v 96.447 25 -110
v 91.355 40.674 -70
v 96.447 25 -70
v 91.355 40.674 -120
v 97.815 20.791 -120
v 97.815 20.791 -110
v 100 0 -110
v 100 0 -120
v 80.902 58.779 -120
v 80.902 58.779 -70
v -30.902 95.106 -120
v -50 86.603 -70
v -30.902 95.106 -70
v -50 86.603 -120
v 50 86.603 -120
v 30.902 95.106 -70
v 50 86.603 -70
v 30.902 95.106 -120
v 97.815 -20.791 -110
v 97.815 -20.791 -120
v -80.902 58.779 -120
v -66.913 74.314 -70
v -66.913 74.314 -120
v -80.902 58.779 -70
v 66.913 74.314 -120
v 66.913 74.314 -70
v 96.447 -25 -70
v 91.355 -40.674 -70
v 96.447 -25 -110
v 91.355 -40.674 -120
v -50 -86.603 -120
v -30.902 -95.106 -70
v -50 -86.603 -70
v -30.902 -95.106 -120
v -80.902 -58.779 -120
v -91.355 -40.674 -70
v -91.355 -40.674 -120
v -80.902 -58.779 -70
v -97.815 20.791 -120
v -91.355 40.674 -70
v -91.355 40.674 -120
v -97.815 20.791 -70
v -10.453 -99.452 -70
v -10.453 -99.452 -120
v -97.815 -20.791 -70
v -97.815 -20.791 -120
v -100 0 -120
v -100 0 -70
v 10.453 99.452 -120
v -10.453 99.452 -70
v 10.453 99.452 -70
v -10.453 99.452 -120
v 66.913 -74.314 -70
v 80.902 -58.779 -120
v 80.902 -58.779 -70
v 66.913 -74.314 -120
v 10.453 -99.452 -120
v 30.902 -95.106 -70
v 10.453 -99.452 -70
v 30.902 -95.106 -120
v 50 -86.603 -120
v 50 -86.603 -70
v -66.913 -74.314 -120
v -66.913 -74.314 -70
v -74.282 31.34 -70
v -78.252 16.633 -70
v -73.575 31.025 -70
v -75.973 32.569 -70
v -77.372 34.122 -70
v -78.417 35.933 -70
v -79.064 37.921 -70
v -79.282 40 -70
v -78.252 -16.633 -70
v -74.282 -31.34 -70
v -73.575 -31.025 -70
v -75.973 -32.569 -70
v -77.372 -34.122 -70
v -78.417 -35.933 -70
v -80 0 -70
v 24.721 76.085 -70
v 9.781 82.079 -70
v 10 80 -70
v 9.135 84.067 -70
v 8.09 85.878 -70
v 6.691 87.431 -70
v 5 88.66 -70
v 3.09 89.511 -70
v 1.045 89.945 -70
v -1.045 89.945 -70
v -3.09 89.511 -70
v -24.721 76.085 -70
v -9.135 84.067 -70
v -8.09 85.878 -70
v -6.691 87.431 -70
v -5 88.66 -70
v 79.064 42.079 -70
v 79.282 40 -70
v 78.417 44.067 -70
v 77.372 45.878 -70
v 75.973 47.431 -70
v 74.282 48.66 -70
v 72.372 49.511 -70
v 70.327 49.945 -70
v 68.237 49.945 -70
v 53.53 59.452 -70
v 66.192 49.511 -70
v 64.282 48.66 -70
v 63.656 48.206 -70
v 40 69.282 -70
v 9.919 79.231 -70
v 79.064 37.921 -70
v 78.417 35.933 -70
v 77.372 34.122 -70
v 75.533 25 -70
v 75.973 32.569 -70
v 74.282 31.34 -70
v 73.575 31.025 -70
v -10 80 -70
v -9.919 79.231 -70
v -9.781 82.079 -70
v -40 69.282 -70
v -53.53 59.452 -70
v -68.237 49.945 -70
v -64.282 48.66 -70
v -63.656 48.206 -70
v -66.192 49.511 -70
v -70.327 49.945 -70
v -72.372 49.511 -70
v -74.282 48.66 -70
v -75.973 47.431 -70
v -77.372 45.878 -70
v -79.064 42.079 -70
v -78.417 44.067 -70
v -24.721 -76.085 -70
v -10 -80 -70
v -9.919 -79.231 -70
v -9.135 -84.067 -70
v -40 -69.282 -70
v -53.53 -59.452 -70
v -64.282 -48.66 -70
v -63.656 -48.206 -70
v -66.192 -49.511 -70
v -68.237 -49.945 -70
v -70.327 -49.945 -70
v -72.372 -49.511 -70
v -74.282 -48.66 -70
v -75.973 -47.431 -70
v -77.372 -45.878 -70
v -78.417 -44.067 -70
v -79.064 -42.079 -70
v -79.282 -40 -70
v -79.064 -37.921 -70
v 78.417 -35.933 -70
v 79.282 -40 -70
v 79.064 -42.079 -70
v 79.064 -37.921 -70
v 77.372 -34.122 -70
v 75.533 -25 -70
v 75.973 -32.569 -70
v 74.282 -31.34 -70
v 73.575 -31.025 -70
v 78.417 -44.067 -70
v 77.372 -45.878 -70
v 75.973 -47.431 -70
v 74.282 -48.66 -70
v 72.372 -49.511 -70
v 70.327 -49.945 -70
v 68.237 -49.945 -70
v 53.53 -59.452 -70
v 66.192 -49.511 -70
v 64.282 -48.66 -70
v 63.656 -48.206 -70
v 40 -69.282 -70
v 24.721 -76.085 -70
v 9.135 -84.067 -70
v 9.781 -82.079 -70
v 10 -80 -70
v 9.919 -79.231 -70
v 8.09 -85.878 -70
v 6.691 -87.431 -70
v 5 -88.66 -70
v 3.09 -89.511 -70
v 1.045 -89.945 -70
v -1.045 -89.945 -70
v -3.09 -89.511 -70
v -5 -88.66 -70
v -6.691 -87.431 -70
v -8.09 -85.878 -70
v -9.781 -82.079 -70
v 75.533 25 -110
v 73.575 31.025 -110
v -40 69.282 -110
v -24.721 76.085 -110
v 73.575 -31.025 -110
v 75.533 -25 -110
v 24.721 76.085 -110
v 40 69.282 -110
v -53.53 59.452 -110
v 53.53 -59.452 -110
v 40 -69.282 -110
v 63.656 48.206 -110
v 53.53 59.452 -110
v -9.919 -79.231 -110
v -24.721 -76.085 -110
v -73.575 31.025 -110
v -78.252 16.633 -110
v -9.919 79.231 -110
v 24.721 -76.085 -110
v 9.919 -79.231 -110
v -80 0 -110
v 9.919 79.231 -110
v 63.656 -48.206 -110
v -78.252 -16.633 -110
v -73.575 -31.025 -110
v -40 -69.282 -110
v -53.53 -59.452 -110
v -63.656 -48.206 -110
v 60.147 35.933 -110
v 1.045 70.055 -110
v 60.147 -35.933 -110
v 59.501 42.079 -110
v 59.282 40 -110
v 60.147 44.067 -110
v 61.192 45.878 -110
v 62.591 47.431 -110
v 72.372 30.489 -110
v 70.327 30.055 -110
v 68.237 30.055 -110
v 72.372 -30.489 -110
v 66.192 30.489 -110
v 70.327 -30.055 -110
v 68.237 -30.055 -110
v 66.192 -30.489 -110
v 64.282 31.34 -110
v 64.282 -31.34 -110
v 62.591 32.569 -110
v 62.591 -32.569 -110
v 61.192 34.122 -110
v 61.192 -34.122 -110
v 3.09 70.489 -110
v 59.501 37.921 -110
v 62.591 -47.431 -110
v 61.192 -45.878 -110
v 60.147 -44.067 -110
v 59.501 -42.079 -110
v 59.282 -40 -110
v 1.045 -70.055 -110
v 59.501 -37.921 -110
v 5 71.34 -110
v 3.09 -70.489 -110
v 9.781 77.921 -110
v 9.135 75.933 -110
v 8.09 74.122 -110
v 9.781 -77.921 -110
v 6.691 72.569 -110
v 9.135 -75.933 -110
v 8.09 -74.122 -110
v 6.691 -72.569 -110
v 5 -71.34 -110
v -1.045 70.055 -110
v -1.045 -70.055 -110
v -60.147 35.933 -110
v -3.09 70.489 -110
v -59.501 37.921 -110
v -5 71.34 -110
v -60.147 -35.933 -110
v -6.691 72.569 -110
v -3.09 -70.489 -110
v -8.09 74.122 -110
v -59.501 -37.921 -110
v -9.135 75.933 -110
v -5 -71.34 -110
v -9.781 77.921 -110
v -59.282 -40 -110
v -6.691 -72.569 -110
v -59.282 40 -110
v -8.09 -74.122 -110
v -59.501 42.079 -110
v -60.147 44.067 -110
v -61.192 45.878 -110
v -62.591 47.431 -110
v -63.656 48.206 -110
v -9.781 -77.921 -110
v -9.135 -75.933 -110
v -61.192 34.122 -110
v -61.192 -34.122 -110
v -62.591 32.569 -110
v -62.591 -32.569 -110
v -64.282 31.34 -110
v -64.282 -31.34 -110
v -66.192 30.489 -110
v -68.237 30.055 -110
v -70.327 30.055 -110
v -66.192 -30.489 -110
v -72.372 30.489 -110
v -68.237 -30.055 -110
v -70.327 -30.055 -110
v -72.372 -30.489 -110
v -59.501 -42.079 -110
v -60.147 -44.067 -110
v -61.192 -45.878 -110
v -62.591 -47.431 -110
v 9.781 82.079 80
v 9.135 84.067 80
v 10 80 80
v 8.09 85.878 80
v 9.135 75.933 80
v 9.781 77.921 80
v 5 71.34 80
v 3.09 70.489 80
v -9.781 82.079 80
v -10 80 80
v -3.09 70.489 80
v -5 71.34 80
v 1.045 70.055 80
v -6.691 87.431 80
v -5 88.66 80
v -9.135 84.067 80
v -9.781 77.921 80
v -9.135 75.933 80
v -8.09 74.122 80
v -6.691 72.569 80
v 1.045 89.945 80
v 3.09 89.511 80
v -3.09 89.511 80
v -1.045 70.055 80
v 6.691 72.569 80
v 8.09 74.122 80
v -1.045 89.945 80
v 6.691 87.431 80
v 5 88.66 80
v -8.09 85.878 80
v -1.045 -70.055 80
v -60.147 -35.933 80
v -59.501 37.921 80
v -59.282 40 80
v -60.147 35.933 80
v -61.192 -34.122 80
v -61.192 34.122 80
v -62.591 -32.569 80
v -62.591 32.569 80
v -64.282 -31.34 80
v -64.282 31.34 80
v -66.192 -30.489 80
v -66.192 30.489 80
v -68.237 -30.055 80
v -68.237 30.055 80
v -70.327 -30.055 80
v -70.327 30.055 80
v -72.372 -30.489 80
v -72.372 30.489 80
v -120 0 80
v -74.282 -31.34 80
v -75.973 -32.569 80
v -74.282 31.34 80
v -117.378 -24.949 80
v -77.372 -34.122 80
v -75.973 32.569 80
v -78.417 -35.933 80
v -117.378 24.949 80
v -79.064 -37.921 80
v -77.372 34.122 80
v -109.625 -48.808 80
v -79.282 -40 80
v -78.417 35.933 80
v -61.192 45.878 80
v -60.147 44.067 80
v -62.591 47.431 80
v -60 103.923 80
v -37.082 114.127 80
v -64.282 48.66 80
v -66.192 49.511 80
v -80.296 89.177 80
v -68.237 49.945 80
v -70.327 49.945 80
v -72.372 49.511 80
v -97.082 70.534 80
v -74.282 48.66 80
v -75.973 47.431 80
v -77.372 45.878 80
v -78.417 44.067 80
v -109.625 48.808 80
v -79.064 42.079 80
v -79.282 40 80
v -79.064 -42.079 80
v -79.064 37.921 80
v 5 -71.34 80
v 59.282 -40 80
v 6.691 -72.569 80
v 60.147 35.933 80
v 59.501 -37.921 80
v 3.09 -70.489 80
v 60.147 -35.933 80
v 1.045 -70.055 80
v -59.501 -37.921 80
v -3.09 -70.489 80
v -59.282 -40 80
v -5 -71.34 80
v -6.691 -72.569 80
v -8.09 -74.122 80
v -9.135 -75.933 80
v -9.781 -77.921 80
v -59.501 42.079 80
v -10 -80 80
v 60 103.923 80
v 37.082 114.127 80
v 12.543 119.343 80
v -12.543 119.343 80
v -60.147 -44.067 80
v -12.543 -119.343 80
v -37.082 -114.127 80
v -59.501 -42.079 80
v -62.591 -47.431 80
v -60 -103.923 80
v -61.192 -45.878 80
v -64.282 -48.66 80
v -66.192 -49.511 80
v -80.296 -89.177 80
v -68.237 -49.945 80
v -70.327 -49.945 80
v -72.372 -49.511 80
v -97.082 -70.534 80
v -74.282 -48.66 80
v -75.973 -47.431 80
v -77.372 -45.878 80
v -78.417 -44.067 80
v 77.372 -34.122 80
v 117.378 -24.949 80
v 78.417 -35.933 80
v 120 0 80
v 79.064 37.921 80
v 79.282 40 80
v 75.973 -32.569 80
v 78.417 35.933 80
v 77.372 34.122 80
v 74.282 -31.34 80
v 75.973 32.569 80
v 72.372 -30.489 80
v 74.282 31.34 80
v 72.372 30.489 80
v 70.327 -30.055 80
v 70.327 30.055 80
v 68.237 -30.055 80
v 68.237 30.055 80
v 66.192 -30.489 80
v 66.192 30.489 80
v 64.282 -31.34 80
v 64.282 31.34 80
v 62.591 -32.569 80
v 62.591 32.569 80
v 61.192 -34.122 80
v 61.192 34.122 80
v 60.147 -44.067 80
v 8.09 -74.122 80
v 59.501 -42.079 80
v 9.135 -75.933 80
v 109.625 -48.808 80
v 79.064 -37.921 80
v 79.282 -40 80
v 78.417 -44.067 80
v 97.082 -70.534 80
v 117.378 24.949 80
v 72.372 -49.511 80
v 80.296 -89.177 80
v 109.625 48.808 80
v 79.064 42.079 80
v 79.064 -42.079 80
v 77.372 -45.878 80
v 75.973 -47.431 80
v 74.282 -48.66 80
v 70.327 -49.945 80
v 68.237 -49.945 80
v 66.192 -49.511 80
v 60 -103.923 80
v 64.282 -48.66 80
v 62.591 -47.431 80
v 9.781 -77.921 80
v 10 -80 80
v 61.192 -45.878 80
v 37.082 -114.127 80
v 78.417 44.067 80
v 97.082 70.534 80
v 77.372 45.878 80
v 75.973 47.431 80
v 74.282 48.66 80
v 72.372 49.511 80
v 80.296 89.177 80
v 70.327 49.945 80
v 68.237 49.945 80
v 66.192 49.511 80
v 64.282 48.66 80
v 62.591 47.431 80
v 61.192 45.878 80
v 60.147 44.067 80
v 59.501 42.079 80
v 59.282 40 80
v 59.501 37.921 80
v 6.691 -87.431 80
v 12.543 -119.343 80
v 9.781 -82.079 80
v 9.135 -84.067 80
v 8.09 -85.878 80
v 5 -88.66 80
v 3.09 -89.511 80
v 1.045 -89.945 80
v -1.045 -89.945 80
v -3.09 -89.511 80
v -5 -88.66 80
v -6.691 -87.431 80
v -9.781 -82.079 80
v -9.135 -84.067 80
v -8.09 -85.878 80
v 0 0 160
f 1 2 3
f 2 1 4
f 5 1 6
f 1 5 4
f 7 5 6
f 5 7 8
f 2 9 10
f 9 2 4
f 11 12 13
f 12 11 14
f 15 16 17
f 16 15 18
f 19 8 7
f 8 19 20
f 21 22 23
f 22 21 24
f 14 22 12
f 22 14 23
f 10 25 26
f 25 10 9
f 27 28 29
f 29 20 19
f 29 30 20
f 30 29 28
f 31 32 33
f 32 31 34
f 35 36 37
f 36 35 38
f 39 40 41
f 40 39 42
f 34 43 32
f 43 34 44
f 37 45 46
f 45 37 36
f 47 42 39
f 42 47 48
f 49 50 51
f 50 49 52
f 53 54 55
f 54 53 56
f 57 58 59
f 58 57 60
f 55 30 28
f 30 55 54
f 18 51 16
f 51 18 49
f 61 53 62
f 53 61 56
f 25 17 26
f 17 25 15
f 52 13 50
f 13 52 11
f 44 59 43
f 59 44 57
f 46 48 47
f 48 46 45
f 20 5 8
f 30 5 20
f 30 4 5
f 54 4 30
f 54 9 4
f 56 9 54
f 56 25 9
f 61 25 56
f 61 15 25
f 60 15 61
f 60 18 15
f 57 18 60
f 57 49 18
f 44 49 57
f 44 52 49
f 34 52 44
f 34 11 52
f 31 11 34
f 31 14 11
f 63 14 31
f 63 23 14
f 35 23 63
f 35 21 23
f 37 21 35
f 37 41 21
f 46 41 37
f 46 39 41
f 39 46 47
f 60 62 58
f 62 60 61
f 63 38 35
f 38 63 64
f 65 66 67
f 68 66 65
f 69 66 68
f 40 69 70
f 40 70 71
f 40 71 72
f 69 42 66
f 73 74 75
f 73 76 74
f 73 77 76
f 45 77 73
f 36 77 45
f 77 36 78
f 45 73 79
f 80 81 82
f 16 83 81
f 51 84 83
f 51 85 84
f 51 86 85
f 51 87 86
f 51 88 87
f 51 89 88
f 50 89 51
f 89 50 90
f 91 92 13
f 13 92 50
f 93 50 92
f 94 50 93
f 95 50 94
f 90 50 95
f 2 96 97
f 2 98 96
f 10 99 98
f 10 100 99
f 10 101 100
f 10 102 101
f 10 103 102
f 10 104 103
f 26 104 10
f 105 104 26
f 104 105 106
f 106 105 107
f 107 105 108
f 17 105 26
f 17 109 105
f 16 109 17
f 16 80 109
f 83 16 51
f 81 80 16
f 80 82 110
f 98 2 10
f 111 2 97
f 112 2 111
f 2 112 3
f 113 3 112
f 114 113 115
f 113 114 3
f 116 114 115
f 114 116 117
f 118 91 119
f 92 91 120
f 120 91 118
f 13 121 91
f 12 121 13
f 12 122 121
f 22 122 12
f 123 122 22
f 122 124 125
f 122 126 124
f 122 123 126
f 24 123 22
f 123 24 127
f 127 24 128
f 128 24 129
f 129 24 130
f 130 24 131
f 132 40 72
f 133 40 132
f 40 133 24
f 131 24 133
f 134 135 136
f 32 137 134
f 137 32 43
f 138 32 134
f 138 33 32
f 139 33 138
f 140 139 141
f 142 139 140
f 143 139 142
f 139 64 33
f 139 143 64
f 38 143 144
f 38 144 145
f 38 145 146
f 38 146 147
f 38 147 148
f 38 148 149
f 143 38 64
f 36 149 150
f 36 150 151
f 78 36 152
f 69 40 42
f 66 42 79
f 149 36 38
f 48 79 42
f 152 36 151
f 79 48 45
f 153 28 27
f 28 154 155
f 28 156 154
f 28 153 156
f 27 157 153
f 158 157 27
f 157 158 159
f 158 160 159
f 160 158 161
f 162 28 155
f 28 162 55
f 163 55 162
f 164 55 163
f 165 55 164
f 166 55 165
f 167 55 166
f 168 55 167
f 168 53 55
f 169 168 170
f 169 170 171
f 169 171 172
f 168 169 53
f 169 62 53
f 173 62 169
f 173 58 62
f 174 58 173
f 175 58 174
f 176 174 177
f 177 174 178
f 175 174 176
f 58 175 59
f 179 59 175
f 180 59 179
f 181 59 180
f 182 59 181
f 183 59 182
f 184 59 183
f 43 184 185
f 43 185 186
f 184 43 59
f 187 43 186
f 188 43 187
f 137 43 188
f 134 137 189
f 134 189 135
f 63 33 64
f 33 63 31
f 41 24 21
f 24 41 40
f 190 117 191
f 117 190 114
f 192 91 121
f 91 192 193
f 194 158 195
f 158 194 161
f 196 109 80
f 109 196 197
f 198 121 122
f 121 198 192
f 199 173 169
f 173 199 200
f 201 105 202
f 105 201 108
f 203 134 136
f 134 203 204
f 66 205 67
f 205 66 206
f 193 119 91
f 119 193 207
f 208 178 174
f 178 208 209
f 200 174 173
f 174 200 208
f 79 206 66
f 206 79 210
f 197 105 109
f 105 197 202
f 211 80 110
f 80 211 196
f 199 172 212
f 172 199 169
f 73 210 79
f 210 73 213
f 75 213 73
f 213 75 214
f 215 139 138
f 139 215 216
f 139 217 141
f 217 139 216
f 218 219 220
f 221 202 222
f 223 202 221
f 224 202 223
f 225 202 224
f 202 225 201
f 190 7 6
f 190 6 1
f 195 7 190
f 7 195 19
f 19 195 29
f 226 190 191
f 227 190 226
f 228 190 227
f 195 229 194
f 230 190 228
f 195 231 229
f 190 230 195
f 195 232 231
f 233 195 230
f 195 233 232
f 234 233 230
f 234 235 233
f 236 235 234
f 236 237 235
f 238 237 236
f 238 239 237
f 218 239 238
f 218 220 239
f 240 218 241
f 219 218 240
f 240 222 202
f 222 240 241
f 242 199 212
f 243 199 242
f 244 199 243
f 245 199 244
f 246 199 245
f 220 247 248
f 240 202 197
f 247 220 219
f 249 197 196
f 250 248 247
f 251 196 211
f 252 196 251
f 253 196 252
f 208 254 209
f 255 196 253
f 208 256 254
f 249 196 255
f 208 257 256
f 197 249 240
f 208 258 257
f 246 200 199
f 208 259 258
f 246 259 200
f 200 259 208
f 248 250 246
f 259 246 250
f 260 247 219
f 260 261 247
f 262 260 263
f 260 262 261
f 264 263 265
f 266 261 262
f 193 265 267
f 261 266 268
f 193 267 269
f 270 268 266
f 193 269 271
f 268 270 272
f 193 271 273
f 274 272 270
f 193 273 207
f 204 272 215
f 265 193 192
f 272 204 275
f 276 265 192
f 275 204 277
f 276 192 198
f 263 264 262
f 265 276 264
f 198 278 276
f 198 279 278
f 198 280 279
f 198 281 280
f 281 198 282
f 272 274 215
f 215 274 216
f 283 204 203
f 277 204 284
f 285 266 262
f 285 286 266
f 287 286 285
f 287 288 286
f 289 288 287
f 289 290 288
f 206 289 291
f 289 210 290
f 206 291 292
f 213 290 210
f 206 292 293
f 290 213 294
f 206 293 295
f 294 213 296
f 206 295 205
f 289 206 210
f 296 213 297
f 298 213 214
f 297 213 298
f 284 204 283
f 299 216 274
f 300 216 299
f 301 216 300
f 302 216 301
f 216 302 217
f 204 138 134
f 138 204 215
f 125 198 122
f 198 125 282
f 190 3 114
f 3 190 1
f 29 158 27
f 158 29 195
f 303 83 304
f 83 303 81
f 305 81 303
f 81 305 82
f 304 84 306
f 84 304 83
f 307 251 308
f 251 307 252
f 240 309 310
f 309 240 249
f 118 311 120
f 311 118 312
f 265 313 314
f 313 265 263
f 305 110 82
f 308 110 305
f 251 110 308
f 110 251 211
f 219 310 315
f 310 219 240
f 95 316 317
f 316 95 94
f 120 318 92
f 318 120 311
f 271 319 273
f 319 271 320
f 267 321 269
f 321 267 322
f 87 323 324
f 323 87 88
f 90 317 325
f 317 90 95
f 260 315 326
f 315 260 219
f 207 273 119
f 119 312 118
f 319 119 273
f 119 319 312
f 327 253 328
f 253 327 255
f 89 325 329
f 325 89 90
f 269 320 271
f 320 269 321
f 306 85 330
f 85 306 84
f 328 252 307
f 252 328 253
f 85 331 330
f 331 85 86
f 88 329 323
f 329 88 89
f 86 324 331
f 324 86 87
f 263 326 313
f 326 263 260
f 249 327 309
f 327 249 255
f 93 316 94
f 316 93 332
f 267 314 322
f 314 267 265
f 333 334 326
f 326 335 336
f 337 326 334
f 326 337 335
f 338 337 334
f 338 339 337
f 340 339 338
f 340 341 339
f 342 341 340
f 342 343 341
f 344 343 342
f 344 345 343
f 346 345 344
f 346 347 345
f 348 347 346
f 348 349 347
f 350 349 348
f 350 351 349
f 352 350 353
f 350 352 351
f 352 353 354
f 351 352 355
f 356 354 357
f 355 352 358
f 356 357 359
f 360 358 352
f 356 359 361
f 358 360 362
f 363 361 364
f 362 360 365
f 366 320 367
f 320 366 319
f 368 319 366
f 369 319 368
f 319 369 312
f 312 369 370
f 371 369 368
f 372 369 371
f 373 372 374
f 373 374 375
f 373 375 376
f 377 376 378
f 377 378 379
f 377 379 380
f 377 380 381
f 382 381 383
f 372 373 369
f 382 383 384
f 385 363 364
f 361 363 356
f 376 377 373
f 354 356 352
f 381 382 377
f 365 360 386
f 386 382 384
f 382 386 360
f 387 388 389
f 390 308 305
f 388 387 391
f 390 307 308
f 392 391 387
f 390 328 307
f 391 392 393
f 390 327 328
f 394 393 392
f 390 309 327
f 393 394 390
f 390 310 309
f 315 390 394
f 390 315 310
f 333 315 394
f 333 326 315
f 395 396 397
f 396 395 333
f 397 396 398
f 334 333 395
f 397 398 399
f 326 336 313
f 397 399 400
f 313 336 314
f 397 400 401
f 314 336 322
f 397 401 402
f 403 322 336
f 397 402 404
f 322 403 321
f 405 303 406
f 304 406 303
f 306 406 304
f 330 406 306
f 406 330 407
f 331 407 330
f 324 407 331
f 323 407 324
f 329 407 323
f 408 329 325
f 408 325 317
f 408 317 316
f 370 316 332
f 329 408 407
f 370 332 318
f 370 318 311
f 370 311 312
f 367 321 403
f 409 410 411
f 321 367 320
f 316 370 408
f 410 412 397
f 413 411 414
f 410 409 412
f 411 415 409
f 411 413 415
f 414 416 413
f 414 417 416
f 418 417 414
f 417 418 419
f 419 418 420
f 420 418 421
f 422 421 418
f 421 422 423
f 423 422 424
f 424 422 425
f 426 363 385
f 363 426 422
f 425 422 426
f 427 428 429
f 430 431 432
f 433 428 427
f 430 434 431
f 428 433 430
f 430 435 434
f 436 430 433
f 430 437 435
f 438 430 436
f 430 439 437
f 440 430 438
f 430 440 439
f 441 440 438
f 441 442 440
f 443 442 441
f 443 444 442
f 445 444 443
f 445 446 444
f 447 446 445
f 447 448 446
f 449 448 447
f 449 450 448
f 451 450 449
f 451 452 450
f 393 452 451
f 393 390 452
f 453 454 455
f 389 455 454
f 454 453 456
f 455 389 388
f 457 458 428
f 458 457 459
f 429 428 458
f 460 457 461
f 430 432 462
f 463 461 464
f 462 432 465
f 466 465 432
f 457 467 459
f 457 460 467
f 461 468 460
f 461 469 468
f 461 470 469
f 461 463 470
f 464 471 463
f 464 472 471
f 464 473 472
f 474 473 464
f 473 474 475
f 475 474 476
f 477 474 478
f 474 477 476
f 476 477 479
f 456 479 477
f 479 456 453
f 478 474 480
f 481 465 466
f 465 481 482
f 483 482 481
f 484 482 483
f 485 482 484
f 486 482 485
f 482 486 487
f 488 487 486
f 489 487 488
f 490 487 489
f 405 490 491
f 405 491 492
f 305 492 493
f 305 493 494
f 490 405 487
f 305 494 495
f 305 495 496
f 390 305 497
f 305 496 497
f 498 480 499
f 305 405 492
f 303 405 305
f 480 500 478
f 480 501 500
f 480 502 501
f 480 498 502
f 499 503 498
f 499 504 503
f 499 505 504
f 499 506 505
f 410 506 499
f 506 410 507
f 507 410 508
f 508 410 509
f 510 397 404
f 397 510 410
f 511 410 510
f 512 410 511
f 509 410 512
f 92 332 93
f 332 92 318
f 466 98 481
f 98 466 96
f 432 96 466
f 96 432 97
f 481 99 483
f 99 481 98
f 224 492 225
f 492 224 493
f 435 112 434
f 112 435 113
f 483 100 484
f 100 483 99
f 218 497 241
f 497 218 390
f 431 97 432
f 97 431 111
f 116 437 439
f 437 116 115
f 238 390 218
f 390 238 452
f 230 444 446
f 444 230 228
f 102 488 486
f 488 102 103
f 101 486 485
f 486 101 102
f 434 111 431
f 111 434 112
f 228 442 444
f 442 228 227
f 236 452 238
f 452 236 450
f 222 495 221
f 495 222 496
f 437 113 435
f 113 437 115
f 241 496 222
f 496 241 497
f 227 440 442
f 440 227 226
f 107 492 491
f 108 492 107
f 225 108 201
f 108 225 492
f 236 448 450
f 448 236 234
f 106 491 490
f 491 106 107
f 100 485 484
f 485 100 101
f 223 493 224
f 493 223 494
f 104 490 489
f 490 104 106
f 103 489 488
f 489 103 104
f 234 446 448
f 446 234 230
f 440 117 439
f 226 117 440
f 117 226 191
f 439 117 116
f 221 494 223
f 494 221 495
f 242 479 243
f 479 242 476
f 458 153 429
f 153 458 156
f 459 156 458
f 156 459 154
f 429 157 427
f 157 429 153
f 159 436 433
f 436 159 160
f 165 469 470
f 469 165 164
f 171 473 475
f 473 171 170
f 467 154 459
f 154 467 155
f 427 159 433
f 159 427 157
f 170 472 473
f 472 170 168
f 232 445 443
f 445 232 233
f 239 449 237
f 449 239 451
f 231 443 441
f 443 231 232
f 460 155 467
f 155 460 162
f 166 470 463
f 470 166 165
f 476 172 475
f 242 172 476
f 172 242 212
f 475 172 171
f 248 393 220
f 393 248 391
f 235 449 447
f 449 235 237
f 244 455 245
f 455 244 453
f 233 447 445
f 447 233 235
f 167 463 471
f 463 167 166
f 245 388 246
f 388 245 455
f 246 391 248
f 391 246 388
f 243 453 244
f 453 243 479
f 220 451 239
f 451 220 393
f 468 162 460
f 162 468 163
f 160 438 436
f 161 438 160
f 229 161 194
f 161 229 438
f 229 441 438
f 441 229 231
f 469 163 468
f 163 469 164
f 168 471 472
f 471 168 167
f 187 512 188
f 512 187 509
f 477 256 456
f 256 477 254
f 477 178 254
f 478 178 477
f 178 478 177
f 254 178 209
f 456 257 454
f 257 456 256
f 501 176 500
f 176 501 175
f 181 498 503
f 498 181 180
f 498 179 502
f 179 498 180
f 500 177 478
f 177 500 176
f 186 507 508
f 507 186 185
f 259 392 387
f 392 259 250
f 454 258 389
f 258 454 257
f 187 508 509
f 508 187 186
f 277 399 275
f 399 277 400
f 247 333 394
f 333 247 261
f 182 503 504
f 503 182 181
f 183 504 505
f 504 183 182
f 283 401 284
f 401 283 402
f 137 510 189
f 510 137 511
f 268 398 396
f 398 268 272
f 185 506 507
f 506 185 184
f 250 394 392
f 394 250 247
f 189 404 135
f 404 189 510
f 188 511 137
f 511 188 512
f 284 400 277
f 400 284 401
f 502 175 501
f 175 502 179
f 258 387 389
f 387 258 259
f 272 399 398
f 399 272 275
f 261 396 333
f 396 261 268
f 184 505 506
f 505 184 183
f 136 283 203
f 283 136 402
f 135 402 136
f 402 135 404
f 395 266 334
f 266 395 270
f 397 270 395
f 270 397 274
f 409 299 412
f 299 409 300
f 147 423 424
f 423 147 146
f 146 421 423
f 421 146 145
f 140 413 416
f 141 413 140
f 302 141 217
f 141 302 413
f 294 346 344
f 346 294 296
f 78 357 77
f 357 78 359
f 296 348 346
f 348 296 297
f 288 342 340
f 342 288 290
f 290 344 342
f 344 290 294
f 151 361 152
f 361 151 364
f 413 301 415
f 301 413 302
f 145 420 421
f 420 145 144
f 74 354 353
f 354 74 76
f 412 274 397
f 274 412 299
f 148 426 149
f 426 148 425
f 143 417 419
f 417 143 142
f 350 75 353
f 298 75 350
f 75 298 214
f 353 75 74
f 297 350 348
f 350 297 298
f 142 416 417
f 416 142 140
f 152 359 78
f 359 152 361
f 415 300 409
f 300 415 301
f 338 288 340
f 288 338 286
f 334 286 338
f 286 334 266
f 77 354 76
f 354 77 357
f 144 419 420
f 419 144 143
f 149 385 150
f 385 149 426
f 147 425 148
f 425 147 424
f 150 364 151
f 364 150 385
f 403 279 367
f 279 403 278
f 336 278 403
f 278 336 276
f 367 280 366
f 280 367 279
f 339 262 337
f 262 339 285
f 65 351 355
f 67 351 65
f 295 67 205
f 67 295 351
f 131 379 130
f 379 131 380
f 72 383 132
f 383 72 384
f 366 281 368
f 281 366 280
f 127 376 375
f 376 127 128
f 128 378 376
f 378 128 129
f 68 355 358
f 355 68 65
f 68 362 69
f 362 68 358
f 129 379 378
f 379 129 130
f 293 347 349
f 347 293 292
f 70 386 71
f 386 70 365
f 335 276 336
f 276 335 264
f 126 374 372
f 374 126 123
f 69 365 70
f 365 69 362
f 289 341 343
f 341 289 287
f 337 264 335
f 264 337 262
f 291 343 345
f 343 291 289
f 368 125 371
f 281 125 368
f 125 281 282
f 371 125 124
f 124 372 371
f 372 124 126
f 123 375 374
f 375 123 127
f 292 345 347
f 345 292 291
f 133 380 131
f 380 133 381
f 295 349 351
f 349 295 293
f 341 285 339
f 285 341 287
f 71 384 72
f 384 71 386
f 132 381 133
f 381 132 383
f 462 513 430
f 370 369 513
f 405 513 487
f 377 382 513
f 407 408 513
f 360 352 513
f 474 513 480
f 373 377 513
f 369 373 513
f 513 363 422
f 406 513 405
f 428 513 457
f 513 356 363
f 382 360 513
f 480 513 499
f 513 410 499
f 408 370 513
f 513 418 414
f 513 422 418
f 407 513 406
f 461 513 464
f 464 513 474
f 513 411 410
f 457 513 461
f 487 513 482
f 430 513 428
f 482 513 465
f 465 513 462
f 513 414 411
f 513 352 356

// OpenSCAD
module example005()
{
	translate([0, 0, -120]) {
		difference() {
			cylinder(h = 50, r = 100);
			translate([0, 0, 10]) cylinder(h = 50, r = 80);
			translate([100, 0, 35]) cube(size=50, center = true);
		}
		for (i = [0:5]) {
			//echo(360*i/6, sin(360*i/6)*80, cos(360*i/6)*80);
			translate([sin(360*i/6)*80, cos(360*i/6)*80, 0 ])
				cylinder(h = 200, r=10);
		}
		translate([0, 0, 200])
			cylinder(h = 80, r1 = 120, r2 = 0);
	}
}

example005();
